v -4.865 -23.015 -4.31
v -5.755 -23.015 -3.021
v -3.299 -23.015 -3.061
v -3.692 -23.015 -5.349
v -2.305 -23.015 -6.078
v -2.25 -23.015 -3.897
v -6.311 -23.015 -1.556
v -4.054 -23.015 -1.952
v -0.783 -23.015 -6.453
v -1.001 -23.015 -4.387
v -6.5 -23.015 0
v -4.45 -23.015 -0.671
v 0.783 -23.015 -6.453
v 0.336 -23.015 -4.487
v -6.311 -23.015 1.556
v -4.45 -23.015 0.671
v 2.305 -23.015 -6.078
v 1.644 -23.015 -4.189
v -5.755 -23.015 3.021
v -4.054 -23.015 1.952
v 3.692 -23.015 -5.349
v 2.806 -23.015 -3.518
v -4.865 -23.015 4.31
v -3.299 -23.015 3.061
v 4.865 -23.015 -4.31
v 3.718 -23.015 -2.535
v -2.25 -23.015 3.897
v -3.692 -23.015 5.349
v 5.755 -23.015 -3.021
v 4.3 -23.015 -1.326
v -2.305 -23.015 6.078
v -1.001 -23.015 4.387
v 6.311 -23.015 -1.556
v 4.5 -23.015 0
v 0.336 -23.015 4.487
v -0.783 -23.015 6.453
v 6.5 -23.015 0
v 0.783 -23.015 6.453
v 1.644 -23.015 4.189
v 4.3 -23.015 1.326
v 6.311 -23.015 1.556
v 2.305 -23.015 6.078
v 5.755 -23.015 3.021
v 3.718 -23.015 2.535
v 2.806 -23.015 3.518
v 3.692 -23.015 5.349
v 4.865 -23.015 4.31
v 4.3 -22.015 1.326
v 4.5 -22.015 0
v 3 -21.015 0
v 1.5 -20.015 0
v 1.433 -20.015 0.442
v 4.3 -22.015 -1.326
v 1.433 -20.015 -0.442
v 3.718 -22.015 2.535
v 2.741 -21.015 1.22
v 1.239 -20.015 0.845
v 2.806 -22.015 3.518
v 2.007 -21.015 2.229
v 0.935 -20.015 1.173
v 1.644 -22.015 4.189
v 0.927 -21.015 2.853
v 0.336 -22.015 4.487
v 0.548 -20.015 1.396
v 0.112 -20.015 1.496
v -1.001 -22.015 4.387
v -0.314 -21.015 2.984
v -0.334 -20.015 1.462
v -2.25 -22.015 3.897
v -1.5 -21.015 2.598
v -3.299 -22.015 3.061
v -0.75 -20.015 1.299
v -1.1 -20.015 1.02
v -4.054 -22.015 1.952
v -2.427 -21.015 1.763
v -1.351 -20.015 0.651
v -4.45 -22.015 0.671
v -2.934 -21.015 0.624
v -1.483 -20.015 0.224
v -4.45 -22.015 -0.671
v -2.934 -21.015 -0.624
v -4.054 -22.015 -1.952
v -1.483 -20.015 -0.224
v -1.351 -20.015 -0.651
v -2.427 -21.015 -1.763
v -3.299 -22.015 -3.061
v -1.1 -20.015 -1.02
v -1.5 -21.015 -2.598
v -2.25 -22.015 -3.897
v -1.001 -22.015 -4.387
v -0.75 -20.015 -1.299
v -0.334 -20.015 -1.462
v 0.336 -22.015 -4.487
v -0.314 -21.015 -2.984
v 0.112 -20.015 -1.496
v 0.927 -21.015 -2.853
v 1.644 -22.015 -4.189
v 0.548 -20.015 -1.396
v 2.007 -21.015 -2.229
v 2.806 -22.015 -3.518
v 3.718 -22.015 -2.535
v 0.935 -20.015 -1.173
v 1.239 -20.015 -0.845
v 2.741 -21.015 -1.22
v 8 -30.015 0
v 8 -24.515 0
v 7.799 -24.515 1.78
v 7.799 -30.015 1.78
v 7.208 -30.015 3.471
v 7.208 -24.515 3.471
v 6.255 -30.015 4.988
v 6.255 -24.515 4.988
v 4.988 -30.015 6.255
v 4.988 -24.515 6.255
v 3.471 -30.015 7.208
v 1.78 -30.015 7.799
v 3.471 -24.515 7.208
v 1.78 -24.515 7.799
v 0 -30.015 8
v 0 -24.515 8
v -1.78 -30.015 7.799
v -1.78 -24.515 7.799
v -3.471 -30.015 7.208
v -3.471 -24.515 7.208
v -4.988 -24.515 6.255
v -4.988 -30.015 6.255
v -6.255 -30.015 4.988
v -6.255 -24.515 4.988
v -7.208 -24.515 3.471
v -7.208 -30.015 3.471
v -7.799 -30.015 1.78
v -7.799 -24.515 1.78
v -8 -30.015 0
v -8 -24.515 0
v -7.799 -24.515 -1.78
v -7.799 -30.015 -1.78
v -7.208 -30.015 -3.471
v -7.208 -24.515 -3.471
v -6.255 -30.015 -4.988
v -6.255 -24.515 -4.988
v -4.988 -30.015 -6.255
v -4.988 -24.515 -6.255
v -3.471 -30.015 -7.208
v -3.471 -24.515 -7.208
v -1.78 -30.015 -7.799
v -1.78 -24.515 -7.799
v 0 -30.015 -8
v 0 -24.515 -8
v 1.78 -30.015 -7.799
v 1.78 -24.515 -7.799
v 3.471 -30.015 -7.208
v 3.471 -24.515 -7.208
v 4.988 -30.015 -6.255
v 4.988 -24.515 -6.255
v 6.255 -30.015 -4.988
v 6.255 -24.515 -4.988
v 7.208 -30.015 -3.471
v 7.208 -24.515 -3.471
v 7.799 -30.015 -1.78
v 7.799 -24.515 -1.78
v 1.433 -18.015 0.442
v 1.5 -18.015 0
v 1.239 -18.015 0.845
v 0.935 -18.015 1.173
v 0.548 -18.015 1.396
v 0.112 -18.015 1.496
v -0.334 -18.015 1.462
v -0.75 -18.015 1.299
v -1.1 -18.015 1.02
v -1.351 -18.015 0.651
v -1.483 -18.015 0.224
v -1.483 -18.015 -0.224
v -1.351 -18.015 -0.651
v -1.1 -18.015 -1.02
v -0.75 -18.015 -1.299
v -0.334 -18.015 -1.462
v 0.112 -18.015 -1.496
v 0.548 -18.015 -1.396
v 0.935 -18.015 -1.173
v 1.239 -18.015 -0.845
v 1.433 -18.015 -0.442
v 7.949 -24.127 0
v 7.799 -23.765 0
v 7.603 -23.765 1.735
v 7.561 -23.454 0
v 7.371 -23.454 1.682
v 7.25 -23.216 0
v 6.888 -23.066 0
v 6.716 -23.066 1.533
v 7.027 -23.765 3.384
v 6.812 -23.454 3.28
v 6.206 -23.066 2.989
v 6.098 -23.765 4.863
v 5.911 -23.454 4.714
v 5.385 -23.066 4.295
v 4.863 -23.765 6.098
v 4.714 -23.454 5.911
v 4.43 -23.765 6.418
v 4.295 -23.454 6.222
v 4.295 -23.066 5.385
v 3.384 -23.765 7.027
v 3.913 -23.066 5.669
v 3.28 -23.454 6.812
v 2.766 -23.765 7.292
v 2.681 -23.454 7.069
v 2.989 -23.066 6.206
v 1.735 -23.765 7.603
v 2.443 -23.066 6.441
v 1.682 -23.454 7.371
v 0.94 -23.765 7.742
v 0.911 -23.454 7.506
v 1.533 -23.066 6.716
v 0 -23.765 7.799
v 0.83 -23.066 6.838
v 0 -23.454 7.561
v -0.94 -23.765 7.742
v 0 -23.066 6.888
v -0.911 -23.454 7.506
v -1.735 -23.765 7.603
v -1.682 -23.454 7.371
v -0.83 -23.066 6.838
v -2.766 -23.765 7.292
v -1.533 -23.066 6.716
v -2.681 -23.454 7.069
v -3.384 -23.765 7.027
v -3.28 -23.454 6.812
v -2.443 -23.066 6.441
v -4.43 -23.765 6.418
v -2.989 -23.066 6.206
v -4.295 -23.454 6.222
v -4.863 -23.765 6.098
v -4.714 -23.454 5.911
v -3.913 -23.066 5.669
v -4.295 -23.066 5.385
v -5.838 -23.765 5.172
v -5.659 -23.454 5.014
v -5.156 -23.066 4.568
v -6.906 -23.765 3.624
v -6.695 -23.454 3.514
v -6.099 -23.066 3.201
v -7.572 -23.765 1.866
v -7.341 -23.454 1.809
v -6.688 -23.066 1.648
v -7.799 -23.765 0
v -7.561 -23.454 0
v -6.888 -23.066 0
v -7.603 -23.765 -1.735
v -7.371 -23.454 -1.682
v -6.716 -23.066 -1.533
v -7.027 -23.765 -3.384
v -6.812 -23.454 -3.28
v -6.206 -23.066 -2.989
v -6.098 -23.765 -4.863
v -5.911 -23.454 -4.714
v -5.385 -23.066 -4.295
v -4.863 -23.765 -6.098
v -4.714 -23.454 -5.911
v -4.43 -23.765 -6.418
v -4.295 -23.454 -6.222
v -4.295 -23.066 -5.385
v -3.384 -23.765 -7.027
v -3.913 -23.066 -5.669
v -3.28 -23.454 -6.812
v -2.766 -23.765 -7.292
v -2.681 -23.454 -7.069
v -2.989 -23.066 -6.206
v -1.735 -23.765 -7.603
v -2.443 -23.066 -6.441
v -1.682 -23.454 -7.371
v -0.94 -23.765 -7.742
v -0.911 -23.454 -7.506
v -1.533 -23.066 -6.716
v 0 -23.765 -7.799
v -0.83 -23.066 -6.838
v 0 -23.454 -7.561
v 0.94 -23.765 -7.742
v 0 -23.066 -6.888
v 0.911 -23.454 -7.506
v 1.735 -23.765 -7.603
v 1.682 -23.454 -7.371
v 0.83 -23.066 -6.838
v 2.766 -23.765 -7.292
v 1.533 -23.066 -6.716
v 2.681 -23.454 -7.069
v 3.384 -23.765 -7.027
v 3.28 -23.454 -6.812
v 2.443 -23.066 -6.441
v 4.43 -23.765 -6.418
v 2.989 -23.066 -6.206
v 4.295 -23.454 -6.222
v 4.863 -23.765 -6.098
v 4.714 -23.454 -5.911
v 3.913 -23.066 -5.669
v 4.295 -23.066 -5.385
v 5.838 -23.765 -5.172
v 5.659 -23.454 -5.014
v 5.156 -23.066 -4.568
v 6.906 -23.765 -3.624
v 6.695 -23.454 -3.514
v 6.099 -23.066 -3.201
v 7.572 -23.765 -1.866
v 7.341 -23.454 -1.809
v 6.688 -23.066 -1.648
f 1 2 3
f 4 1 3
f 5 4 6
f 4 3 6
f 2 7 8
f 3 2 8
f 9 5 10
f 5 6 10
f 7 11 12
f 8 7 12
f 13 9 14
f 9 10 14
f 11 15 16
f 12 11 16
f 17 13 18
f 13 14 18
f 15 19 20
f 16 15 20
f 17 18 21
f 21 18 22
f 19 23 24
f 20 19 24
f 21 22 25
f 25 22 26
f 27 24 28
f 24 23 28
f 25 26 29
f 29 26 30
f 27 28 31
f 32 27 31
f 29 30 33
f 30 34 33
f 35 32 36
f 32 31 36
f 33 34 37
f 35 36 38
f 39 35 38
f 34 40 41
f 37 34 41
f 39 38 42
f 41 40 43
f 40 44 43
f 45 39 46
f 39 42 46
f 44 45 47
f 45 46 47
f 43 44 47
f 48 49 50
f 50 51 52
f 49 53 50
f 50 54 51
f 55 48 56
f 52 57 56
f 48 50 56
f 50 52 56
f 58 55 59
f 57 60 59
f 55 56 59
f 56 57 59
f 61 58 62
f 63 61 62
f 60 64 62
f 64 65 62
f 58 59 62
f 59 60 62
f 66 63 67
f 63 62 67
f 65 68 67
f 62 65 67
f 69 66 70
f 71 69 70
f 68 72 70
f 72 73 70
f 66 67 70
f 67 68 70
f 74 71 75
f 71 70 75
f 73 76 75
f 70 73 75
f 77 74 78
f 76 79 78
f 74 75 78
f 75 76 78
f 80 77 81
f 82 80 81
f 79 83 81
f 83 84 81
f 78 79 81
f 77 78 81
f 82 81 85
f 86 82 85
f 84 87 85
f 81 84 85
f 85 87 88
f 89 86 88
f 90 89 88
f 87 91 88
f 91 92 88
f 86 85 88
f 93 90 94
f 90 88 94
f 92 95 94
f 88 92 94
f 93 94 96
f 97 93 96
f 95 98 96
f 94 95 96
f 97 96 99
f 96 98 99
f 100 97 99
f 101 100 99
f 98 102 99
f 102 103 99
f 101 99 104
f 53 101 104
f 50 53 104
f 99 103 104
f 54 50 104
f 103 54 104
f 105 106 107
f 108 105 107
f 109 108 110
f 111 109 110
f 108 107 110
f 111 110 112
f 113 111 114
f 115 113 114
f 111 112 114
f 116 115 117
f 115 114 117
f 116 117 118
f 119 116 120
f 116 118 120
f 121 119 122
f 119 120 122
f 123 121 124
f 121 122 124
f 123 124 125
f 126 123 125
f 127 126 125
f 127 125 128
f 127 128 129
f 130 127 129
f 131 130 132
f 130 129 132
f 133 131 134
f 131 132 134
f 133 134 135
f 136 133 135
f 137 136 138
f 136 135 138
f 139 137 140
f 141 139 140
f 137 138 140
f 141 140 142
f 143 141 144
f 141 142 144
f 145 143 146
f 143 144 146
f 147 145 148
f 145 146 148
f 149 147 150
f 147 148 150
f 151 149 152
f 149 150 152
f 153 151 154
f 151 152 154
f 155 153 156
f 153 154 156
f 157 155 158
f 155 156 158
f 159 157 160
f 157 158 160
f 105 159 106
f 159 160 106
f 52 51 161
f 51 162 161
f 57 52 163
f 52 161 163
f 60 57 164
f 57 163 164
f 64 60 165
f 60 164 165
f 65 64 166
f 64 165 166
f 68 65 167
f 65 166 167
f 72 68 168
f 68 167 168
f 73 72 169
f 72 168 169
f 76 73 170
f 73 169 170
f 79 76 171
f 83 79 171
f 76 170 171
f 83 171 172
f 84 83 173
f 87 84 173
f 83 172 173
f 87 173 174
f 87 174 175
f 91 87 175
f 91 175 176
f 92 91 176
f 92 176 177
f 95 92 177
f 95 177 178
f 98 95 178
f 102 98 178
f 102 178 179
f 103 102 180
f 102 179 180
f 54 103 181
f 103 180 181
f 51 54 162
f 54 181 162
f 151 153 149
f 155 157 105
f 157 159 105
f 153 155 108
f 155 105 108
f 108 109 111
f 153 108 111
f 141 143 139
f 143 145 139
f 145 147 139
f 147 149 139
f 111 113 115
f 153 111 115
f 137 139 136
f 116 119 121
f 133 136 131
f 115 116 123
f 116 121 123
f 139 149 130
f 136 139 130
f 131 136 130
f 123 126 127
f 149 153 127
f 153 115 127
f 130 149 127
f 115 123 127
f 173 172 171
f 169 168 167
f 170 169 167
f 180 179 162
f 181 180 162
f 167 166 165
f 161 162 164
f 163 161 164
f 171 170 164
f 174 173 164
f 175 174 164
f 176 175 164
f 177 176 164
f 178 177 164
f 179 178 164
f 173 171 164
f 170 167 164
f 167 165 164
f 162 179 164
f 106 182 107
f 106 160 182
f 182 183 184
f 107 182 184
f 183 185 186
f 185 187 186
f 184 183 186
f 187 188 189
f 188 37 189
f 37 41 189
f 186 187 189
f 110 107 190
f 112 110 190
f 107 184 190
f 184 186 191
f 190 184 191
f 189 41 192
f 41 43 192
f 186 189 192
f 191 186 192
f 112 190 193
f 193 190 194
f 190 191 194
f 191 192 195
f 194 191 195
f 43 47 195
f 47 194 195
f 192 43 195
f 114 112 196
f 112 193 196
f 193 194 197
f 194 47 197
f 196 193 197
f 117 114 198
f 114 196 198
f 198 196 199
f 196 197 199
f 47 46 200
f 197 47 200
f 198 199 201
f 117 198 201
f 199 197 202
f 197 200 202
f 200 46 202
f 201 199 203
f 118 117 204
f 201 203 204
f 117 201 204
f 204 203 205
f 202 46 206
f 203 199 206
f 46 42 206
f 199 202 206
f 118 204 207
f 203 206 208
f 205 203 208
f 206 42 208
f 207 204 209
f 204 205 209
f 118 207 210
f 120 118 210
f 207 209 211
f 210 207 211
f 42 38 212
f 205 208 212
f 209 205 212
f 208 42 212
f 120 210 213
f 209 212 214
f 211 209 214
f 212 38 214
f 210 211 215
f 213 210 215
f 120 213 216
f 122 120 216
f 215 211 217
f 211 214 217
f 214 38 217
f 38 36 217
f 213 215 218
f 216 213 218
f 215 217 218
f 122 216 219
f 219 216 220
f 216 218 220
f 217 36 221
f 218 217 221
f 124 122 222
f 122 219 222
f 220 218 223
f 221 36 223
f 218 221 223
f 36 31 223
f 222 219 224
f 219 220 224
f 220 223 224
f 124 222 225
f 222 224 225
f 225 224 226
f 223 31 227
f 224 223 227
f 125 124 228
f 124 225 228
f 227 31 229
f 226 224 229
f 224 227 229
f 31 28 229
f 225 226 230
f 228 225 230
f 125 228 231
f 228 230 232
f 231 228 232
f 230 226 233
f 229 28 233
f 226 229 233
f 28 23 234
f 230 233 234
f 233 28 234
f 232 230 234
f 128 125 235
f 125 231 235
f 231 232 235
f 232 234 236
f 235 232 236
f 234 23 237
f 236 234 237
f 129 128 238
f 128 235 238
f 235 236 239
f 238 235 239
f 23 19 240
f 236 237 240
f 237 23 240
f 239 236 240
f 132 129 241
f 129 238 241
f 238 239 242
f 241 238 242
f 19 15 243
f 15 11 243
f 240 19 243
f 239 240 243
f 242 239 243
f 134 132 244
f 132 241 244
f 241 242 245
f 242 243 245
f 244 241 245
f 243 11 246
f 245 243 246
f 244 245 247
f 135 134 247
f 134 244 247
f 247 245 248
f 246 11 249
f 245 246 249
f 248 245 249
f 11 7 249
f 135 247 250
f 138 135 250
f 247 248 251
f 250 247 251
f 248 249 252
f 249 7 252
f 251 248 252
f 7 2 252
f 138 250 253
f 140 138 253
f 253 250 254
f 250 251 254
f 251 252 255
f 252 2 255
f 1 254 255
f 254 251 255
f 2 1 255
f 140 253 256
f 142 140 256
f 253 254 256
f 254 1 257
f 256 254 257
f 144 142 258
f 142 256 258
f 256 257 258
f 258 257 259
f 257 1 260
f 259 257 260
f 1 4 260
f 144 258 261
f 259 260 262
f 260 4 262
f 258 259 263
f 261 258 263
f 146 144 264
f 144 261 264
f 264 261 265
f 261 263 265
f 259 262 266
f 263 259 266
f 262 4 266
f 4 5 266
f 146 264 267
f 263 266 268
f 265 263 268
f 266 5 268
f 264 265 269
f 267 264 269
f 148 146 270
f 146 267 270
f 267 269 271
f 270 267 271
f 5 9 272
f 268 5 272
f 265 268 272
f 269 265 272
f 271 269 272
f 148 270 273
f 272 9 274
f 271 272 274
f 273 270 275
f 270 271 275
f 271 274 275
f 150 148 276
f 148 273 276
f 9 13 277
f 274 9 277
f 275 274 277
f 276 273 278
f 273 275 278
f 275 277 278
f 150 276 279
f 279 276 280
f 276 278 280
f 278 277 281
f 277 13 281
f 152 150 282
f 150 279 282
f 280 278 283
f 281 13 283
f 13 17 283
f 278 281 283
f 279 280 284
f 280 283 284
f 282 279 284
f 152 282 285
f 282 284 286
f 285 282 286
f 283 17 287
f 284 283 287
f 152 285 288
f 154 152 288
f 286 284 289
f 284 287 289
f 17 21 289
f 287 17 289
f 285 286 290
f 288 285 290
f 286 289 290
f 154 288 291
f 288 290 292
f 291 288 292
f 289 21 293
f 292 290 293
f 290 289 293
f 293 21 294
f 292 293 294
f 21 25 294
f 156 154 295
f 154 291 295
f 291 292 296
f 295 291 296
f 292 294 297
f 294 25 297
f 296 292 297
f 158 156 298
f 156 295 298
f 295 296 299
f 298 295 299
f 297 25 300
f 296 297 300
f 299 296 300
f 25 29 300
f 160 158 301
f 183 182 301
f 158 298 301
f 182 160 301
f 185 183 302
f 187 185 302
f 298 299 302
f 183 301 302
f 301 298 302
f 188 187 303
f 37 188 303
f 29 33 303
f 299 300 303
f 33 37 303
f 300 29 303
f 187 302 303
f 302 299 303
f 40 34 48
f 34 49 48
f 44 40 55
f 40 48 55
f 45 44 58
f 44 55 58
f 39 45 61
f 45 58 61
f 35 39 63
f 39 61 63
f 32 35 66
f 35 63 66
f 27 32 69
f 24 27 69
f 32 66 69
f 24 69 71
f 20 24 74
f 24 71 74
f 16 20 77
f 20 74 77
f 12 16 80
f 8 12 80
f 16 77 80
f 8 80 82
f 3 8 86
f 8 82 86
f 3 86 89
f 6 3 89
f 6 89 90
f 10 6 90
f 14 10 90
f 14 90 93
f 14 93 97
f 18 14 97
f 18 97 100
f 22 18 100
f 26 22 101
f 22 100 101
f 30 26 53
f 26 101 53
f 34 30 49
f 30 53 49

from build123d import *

# Parameters (mm, degrees)
FILLET2_R = 1.5


with BuildPart() as part:
    # Sketch2 → Revolve1 (revolve)
    with BuildSketch(Plane.XY):
        Polygon((0, -30.015007431), (8, -30.015007431), (8, -23.015007431), (4.5, -23.015007431), (4.5, -22.015007431), (1.5, -20.015007431), (1.5, -18.015007431), (0, -18.015007431), align=None)
    revolve(axis=Axis((0, 46.076216781, 0), (0, -1, 0)))

    # Fillet2
    fillet2_edges = [part.edges().sort_by_distance(p)[0] for p in [
        (-8, -23.015007431, 0),
    ]]
    fillet(fillet2_edges, radius=FILLET2_R)


solid = part.part
